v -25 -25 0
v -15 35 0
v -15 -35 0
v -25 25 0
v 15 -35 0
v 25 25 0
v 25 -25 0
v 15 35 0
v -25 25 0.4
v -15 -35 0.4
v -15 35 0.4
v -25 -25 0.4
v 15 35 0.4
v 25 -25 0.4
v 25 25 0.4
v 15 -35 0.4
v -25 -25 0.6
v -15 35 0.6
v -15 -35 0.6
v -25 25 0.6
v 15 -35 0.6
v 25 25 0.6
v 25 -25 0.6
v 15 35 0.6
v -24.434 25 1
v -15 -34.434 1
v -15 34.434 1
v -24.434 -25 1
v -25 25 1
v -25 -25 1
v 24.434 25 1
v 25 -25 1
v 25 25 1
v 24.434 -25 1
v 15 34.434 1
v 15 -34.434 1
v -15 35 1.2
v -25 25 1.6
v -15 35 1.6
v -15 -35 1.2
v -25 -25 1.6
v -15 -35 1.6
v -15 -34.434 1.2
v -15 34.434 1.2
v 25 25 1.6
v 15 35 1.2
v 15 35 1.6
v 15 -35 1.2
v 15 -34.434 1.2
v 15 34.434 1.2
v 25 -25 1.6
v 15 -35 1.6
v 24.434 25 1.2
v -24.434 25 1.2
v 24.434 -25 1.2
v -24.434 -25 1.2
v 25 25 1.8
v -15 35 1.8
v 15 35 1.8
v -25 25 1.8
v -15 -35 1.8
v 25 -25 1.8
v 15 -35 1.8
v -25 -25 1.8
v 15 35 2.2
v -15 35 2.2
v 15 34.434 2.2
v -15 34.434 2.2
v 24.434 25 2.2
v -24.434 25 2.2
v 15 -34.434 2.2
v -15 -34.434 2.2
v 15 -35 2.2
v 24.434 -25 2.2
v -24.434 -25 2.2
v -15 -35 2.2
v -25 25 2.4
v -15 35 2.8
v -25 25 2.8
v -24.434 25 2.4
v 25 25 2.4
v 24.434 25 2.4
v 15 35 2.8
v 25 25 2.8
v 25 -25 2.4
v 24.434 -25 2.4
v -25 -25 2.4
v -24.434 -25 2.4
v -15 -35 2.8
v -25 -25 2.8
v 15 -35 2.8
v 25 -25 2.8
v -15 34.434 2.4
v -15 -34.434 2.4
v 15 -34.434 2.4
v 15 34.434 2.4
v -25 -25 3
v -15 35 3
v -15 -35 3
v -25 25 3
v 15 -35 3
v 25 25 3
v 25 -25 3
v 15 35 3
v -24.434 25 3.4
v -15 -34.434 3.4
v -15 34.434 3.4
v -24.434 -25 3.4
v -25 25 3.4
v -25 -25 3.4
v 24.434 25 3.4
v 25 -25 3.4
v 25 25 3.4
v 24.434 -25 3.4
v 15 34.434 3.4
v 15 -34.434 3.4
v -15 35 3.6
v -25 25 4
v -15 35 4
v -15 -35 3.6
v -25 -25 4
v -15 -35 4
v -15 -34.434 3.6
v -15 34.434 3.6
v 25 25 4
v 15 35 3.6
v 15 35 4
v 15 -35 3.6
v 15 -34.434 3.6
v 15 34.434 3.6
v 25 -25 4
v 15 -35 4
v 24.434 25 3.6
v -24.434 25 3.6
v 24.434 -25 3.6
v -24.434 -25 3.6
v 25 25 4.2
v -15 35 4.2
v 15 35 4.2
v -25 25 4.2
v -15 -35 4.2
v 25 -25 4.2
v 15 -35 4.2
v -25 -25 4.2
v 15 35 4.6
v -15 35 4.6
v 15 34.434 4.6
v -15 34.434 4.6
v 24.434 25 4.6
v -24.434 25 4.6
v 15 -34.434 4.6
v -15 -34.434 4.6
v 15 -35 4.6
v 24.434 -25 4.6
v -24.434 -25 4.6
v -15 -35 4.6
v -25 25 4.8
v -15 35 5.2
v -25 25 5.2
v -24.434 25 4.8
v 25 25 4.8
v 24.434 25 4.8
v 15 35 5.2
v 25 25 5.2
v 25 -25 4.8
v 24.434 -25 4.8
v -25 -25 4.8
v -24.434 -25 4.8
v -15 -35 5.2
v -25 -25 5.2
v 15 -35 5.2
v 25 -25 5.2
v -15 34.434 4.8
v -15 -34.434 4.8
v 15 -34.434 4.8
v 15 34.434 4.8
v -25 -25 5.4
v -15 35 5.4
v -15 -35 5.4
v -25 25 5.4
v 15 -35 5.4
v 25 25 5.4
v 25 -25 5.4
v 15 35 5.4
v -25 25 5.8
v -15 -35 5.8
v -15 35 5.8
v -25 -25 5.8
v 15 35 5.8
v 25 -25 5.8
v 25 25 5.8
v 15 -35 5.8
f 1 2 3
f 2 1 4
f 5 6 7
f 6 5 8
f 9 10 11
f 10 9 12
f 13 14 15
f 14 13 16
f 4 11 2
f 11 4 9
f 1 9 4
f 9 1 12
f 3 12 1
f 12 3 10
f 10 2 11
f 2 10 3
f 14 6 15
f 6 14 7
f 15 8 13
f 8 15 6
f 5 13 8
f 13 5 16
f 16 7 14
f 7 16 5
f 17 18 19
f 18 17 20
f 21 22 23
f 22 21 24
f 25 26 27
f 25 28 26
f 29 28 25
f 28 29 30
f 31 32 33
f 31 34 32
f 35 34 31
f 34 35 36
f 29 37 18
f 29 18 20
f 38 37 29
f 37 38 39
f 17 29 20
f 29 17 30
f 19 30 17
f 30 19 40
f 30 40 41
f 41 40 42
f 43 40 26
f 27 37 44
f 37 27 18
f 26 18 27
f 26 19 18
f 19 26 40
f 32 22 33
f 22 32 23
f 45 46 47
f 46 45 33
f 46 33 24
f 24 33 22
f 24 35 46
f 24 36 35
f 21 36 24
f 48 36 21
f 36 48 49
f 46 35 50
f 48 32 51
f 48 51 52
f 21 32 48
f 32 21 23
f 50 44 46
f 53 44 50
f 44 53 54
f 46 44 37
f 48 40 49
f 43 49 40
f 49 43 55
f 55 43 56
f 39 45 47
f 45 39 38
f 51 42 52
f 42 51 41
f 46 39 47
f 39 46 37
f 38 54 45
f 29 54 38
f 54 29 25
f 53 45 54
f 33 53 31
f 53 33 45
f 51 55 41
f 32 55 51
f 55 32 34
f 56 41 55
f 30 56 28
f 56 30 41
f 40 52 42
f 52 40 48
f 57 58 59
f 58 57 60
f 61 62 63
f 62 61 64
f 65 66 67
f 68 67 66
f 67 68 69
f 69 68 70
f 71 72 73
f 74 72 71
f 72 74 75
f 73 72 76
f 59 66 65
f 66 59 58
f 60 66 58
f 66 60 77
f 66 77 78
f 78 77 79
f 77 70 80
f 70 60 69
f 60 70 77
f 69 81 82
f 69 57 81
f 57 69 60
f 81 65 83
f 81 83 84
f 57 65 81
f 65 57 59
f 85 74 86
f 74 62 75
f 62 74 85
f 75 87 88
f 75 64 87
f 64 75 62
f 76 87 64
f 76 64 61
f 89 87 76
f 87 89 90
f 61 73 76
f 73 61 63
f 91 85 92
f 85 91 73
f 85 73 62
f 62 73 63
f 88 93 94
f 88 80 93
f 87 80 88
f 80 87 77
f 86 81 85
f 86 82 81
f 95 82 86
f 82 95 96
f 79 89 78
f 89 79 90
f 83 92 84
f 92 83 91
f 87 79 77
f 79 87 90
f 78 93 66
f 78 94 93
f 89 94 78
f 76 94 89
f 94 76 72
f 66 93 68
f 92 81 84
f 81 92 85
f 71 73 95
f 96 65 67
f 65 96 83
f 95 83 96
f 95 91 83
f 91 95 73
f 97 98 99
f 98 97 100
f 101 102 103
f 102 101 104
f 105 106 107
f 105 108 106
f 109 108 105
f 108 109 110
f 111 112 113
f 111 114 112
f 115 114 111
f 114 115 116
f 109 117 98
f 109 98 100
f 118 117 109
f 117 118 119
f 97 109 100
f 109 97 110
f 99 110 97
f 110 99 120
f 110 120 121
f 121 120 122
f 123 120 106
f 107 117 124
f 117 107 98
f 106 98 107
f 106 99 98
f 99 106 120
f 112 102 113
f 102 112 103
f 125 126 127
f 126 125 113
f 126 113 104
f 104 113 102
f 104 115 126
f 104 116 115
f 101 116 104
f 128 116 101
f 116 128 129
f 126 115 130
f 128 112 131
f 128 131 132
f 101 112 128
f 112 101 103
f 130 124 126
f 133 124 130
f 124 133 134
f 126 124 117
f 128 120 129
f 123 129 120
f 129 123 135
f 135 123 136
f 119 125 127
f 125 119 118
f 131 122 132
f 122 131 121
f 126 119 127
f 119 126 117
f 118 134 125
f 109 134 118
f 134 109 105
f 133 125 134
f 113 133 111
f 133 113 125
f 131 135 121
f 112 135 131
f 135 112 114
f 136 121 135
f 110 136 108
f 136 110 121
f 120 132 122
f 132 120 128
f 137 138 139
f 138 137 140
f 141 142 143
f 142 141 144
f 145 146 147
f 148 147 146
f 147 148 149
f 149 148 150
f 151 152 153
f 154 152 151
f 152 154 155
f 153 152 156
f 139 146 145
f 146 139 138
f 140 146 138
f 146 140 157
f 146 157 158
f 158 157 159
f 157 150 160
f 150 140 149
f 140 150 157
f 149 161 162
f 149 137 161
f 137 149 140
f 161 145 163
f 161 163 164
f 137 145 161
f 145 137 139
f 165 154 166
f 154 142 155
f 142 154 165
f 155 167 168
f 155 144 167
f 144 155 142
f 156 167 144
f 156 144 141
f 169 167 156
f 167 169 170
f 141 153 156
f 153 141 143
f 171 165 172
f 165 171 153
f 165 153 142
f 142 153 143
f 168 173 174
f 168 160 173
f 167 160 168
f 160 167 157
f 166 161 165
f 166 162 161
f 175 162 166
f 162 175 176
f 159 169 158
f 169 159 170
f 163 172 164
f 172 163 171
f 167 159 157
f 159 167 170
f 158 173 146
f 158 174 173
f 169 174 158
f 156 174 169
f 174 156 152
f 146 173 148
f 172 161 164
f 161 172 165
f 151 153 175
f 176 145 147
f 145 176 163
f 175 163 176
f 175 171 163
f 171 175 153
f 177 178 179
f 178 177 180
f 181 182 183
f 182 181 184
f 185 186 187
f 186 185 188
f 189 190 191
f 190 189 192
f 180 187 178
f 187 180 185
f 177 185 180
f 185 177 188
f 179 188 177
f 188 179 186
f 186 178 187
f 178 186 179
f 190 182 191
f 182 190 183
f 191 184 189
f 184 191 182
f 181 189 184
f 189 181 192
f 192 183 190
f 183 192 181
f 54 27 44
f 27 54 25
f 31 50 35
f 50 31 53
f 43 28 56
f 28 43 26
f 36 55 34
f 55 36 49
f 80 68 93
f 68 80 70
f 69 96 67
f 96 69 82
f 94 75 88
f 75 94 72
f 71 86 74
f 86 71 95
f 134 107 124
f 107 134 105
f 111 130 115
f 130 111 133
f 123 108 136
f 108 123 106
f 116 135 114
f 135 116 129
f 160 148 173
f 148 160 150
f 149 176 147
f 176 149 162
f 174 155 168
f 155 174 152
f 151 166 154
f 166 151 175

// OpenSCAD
sheet_thickness = .4; // [0:.05:2]
interface_thickness = .2; // [0:.05:2]
size = [50,70];
width = 10;
number_of_layers = 10;
//mounting=false
module chamfkowski(delta){

}
//%linear_extrude(sheet_thickness) square(size, center=true);


ep=.1;
module layer(even=true)
linear_extrude(sheet_thickness)
difference(){
  delta=width*(1+1/sqrt(2));
  offset(delta=delta, chamfer=true) offset(-delta) square(size, center=true);
  if(even){
    offset(delta=-width) square(size + [0,2*width+ep], center=true);
  } else {
    offset(delta=-width) square(size + [2*width+ep,0], center=true);
  }
}


//sheets
for(i=[0:number_of_layers-1]){
  translate([0,0,i*(sheet_thickness+interface_thickness)]){
    layer(floor(i/2)%2==0);
  }
}
//corner connectors
#for(i=[1:2:number_of_layers-2]){
  translate([0,0,i*(sheet_thickness+interface_thickness) + sheet_thickness/2]){
    linear_extrude(interface_thickness+sheet_thickness)
    difference() {
      delta = width * (1 + 1 / sqrt(2));
      offset(delta = delta, chamfer = true) offset(-delta) square(size, center = true);
      offset(delta = delta-sheet_thickness, chamfer = true) offset(-delta) square(size, center = true);
      offset(delta=-width) square(size + [0,2*width+ep], center=true);
      offset(delta=-width) square(size + [2*width+ep,0], center=true);
    }
  }
}

//outside edge connectors
//inside edge connectors
